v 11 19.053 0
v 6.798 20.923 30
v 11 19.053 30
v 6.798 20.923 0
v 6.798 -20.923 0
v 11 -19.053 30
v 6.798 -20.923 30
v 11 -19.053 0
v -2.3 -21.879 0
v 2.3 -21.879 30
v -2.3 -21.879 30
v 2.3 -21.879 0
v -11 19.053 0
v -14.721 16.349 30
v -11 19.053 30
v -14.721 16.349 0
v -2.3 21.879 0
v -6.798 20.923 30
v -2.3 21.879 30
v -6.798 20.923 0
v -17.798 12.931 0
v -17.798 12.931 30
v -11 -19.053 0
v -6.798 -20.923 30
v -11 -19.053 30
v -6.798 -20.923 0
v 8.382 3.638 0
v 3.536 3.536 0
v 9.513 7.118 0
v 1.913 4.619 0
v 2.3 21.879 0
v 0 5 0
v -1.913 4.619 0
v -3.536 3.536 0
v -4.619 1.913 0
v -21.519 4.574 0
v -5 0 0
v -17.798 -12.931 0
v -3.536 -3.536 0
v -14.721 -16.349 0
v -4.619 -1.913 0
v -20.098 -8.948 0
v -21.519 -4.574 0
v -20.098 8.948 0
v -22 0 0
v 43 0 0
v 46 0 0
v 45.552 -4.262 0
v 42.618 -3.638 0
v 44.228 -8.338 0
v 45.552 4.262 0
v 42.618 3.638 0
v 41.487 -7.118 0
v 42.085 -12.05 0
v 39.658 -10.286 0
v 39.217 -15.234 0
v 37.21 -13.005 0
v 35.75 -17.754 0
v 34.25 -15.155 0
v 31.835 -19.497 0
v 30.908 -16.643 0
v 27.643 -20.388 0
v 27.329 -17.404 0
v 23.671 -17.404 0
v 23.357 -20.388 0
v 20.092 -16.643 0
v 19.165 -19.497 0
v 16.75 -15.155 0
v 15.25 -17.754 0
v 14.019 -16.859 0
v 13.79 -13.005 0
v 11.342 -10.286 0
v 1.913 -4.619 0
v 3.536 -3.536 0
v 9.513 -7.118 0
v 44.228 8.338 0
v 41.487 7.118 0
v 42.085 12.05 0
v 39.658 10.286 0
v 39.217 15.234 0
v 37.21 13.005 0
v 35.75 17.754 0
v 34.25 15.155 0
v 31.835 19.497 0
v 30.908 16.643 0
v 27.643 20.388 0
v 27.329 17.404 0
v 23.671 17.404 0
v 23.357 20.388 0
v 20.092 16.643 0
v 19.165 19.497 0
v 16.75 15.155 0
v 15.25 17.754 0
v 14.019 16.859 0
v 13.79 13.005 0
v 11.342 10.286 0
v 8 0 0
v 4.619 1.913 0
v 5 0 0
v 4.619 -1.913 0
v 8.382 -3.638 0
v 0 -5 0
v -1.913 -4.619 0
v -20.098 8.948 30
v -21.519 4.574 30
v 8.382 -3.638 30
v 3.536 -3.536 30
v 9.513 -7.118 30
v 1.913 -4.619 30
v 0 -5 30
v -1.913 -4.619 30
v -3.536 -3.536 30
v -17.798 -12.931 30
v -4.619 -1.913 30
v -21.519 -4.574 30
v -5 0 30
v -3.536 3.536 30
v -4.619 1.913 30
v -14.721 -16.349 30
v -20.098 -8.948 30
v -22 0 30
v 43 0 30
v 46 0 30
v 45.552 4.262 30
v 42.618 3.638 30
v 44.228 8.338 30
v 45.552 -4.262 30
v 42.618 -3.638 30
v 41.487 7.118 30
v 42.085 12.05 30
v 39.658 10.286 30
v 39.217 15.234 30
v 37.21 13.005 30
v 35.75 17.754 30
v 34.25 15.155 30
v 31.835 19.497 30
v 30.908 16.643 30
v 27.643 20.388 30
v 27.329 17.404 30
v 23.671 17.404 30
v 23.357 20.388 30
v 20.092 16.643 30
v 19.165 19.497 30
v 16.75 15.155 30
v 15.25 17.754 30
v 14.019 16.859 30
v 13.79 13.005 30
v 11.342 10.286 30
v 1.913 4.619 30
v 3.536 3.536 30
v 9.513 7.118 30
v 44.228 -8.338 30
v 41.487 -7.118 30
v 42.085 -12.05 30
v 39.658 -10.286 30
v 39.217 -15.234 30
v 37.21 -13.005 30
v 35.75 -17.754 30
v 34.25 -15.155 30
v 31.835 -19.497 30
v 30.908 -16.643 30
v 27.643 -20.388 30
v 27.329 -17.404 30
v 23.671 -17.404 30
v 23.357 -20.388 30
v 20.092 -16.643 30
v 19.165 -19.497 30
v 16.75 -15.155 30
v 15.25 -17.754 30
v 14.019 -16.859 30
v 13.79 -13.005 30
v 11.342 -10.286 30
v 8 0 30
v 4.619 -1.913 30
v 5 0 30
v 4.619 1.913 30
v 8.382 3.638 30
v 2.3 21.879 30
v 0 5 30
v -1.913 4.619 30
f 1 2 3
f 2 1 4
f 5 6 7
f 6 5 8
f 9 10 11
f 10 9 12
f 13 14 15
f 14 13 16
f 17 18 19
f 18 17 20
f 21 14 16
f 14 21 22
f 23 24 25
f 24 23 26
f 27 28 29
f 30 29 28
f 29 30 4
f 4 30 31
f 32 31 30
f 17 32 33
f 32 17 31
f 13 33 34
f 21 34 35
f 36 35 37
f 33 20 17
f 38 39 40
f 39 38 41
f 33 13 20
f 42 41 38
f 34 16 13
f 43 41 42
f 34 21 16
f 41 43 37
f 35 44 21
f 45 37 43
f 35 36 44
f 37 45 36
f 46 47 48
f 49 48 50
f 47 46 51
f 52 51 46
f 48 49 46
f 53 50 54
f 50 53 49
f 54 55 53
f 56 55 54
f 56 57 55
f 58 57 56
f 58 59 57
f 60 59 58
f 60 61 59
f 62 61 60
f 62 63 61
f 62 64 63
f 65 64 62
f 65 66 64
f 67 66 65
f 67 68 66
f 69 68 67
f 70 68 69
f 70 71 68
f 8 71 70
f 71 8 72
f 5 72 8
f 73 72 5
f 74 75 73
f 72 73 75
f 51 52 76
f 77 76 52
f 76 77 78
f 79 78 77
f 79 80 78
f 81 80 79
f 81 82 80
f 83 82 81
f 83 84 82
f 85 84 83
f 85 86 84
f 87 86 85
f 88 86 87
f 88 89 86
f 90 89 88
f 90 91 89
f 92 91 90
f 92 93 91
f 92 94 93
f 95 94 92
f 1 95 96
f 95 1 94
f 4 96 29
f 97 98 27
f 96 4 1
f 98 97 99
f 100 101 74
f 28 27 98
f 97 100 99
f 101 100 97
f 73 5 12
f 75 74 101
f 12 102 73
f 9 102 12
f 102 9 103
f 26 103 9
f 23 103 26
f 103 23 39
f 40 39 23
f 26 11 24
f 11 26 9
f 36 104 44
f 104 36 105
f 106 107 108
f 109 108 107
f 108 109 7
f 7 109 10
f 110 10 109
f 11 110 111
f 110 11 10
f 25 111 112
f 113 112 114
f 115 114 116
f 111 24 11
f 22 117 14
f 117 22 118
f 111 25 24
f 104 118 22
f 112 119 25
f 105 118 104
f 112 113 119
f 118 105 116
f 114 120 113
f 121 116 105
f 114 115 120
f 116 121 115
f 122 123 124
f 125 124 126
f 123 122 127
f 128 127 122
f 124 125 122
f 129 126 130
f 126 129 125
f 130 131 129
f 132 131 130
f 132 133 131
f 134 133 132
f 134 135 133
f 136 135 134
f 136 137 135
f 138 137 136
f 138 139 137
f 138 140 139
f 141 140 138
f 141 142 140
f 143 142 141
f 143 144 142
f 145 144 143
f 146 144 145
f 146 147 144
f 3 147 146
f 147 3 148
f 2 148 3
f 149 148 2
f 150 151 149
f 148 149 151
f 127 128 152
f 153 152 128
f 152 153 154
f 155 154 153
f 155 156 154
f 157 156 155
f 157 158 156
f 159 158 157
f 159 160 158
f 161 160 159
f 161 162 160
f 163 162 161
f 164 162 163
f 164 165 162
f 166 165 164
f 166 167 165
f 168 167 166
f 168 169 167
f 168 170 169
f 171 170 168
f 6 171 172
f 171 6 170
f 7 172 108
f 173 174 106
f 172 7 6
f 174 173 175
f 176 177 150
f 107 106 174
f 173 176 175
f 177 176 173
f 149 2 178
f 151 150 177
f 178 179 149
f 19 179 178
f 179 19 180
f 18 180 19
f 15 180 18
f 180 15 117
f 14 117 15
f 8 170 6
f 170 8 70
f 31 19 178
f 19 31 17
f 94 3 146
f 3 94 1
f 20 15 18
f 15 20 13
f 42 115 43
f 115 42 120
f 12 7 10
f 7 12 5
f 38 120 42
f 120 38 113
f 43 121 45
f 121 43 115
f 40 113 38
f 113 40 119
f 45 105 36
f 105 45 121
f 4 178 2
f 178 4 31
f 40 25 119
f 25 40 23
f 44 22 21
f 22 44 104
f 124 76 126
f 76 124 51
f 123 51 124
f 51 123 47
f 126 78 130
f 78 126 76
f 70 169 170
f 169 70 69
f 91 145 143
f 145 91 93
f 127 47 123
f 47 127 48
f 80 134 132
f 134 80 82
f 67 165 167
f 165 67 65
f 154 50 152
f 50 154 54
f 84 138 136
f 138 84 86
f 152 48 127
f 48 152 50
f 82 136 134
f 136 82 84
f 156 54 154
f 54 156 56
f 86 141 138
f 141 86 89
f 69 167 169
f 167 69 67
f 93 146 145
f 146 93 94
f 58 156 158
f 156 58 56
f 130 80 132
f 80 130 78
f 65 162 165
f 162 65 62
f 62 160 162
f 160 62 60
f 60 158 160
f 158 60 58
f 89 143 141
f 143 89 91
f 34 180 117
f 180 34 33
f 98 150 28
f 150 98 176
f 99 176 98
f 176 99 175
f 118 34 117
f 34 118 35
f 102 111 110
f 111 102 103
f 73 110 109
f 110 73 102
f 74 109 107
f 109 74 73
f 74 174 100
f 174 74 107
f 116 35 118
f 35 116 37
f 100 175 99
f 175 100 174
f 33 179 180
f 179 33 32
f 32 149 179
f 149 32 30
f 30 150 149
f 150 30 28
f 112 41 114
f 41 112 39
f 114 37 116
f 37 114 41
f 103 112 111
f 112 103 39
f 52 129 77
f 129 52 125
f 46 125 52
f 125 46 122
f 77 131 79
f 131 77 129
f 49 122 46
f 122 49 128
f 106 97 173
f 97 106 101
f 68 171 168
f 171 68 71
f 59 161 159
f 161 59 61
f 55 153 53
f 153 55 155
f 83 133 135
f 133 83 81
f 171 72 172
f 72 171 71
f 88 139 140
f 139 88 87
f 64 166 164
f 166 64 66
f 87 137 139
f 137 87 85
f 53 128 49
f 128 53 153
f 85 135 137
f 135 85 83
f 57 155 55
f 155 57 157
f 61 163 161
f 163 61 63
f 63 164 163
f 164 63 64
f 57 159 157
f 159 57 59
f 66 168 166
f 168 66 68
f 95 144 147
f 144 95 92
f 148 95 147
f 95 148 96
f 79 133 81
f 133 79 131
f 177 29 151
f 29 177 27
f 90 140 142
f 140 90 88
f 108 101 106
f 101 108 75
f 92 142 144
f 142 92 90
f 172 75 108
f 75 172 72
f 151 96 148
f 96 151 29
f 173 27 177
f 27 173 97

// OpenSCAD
// pH_bottle.scad - to hold bottle on brokenmeter

bottle=35/2;
peg=10/2;
standarea=23-1;
h=30;
spacer=3;
otherhole=10/2;
otherholeh=5;
bottlecenter=peg+bottle+spacer;

//put on plane
translate([0,0,h/2]) {
    difference() {
        union() {
            //main body
            cylinder(h, r=standarea, center=true);
            //holding wall for bottle
            translate([bottlecenter,0,0]) {
                cylinder(h, r=bottle+spacer, center=true);
            }
        }
        //hole to fit peg
        cylinder(h+spacer, r=peg, center=true);
        //bottle holder space
        translate([bottlecenter,0,0]) {
            cylinder(h+spacer, r=bottle, center=true);
        }
        //other mouting hole
        translate([0,0,(h/2)-(otherholeh/2)]) {
            cylinder(otherholeh+spacer, r=otherhole, center=true);    
        }
    }
}
